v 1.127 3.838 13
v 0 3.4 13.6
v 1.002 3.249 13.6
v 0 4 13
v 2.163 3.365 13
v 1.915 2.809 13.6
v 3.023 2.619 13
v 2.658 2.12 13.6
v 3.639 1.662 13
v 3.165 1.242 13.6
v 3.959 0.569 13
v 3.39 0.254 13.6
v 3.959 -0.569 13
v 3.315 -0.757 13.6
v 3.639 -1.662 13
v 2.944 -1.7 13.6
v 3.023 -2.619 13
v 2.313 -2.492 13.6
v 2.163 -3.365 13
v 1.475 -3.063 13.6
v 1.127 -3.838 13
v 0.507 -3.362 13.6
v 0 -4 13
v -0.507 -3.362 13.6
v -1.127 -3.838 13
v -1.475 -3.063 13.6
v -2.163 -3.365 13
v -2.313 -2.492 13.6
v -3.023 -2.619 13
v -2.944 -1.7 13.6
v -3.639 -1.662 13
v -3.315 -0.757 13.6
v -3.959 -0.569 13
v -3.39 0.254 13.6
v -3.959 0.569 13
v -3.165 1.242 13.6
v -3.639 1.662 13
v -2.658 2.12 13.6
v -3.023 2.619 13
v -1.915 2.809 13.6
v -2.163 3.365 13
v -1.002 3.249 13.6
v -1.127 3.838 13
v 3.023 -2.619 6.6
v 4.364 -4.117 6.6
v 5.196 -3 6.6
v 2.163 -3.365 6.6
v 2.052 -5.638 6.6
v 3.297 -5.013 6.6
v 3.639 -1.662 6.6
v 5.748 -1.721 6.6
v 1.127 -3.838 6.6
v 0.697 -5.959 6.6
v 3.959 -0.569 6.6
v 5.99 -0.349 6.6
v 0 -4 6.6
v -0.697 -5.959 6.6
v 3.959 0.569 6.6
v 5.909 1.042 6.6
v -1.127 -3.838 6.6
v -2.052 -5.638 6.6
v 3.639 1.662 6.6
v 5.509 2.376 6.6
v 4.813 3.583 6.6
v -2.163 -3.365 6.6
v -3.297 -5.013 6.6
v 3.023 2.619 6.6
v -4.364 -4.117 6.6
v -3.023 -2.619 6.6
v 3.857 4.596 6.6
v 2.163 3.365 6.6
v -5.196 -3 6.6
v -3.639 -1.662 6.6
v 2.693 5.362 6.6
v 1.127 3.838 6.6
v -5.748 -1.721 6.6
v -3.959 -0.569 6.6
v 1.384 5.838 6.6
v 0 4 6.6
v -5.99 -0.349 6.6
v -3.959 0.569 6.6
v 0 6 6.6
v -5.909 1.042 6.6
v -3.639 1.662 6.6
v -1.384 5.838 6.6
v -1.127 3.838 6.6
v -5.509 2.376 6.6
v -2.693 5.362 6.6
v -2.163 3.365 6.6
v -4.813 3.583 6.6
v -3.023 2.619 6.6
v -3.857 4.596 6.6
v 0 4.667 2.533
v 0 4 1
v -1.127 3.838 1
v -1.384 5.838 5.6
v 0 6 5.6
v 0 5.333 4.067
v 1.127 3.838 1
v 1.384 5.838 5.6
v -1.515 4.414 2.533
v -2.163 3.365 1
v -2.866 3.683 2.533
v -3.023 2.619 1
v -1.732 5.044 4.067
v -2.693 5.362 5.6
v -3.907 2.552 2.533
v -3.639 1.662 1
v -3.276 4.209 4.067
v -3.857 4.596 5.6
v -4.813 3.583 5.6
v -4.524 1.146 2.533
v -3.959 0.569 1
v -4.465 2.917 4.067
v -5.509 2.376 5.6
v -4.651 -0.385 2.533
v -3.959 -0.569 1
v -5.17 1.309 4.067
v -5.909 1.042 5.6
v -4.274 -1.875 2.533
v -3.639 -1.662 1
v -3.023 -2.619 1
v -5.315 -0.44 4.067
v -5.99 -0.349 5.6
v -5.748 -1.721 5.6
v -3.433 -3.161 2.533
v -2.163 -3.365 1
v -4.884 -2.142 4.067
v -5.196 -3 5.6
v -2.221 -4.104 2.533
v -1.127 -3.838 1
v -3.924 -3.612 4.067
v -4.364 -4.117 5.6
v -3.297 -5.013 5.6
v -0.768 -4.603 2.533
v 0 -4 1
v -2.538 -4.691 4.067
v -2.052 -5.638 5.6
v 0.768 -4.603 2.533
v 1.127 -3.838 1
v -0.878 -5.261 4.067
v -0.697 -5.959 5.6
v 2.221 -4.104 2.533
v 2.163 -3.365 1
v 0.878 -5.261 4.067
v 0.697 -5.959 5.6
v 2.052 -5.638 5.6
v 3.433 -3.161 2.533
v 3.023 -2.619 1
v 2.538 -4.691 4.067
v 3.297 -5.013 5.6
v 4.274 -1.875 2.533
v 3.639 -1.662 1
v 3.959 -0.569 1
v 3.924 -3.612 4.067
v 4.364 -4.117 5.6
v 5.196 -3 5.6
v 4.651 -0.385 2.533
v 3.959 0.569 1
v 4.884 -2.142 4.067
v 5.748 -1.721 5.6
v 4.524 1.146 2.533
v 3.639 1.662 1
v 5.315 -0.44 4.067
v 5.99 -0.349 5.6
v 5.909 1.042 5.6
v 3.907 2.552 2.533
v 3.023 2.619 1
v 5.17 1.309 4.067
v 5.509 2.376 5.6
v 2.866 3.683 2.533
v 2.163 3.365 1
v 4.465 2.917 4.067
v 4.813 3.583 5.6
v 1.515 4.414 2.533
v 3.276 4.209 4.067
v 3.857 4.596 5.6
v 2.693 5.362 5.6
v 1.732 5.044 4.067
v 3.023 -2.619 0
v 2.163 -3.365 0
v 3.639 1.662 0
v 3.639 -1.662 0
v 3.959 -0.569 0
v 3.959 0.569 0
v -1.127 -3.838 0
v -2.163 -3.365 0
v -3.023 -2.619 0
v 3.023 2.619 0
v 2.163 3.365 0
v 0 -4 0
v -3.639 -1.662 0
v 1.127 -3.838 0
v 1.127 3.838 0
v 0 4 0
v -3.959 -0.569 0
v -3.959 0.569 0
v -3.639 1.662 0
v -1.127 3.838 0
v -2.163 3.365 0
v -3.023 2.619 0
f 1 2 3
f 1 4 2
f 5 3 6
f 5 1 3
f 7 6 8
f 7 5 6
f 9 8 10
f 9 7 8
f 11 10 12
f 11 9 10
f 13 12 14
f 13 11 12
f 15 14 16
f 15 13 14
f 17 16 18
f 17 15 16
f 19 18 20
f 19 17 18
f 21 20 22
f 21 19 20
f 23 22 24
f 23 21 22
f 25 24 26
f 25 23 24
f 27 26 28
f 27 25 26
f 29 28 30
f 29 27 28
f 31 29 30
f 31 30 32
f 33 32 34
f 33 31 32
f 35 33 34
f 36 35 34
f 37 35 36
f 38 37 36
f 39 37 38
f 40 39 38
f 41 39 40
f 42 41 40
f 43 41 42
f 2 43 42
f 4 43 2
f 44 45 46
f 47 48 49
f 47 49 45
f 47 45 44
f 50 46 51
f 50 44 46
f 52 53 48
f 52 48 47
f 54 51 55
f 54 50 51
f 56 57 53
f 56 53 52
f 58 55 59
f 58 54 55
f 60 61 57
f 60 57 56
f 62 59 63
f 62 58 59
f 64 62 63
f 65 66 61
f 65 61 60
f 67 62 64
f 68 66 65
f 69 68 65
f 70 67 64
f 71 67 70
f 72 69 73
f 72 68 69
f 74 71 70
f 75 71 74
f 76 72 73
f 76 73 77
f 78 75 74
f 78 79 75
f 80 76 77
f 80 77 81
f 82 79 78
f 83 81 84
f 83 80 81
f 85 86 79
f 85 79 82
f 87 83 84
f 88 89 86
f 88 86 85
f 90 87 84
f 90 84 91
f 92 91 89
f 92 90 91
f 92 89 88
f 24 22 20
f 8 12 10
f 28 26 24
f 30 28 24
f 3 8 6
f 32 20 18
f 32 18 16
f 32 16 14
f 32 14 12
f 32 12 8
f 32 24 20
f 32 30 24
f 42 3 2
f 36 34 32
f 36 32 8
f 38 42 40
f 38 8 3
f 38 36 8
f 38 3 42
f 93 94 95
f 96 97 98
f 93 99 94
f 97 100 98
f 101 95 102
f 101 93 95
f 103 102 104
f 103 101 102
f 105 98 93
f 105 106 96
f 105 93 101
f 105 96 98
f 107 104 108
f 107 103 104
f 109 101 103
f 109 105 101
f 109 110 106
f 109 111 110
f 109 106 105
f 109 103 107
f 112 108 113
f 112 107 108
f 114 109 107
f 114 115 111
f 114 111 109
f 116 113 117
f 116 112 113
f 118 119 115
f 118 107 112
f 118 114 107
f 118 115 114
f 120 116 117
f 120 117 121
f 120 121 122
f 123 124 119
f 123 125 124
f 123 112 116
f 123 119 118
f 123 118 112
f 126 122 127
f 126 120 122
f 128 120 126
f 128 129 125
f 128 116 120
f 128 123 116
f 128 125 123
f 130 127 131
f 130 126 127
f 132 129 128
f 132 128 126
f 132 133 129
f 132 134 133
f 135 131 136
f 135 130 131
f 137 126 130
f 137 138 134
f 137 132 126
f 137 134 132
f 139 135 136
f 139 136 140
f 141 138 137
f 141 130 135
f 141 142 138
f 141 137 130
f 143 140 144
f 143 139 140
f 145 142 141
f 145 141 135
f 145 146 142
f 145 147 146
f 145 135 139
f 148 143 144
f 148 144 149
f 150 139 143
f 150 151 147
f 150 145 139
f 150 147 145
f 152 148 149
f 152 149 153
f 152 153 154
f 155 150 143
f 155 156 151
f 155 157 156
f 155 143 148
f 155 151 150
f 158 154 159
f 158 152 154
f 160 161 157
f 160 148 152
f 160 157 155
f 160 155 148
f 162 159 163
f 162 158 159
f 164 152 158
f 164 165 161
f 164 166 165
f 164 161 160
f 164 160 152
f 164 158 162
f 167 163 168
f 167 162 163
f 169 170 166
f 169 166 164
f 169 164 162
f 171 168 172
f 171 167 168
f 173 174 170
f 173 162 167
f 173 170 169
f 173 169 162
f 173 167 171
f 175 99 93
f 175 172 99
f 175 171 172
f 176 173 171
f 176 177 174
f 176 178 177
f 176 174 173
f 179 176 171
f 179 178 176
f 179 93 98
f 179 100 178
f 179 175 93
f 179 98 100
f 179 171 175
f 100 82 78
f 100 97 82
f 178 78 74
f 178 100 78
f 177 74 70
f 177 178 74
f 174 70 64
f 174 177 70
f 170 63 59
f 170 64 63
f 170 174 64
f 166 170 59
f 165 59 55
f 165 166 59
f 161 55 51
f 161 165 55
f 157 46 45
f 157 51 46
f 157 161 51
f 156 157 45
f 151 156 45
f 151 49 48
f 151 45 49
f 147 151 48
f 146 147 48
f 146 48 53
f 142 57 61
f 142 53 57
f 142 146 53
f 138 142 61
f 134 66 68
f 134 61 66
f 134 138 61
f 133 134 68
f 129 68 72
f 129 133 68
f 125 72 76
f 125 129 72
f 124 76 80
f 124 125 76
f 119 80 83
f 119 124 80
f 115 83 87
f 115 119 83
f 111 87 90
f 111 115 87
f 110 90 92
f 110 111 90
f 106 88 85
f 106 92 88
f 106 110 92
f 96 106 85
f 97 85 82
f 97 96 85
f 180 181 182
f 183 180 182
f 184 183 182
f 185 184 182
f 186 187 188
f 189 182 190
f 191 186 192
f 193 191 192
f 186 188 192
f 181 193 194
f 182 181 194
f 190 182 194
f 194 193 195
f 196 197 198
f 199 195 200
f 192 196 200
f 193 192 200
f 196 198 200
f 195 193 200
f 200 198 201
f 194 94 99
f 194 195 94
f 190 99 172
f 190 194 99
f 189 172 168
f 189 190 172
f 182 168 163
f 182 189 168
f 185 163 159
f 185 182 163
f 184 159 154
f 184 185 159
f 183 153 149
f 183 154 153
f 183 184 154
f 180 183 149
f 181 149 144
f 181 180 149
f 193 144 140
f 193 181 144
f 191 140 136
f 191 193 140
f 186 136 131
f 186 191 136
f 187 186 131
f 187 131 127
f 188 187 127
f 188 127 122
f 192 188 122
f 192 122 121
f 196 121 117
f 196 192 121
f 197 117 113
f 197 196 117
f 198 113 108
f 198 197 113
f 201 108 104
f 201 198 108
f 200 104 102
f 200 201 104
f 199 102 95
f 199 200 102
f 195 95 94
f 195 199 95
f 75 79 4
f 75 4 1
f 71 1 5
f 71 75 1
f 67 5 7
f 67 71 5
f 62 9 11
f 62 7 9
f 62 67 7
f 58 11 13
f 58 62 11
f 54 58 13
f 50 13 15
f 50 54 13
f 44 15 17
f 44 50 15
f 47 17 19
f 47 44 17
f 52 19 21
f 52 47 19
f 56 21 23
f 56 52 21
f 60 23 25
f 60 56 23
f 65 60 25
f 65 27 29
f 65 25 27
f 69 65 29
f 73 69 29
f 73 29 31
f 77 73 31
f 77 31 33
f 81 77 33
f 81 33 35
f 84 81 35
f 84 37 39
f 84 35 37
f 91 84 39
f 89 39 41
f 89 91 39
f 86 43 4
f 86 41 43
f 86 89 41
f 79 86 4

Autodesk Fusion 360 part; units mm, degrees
sketch "Schizzo1" plane through (0, 0, 0) normal (1, 0, 0) x (0, 1, 0)
  line L0 (0, 0) -> (0, 13.6)
  line L1 (0, 13.6) -> (4, 13.6)
  line L2 (4, 13.6) -> (4, 6.6)
  line L3 (4, 6.6) -> (6, 6.6)
  line L4 (6, 6.6) -> (6, 5.6)
  line L5 (6, 5.6) -> (4, 1)
  line L6 (4, 1) -> (4, 0)
  line L7 (4, 0) -> (0, 0)
  line L8 (0, 0) -> (0, -9.2) construction
  line L9 (0, -9.2) -> (10, -9.2) construction
  line L10 (0, -4) -> (10, -4) construction
  line L11 (0, 6.8) -> (10, 6.8) construction
  dimension "d1" = 8
  dimension "d2" = 8
  dimension "d3" = 7
  dimension "d4" = 10.8
  dimension "d5" = 16
  dimension "d6" = 0.2
  dimension "d7" = 10
  dimension "d8" = 2
  dimension "d10" = 4
  dimension "d11" = 1
  dimension "d12" = 1
revolve "Rivoluzione1" add sketch "Schizzo1" angle 360 about axis through (0, 0, 0) along (0, 0, 1)
chamfer "Smusso1" distance 0.6 angle 45 1 edges at (-3.7293, 1.4465, 13.6)
component "Component" placed x (1, 0, 0) y (0, 1, 0) z (0, 0, 1) at (0, 0, 0)
